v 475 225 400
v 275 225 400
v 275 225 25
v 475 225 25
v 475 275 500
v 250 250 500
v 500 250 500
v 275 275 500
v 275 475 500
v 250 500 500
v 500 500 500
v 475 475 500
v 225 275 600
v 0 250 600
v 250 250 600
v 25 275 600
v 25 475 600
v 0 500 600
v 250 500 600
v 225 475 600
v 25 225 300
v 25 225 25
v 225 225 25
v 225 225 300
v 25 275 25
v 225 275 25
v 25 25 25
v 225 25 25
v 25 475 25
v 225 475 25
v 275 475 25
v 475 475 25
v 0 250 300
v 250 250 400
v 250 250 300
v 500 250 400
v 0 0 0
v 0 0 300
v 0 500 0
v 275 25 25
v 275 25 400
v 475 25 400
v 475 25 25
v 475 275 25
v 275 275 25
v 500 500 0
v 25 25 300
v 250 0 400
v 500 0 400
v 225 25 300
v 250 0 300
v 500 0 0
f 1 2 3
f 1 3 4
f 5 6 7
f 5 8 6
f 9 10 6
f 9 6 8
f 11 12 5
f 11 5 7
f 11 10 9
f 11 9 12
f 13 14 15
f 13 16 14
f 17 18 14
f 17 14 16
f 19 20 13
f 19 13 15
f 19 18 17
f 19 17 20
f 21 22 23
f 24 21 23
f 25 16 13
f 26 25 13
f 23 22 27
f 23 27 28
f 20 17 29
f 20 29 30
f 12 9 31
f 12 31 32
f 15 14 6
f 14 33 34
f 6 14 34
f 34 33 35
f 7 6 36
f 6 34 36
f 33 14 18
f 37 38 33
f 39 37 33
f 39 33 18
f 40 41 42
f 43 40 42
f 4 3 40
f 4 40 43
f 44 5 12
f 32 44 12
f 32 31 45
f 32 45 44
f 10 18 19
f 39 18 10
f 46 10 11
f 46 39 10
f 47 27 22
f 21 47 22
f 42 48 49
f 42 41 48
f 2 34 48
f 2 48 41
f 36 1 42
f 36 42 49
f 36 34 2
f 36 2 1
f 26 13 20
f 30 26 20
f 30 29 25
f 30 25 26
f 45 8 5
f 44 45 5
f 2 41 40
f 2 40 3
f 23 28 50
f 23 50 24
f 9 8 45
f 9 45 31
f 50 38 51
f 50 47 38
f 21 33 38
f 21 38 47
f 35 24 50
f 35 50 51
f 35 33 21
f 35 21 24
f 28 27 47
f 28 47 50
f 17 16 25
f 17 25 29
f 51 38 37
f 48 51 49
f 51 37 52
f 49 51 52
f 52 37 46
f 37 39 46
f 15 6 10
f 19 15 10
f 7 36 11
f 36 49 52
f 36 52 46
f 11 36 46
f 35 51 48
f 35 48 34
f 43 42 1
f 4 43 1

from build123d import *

# Parameters (mm, degrees)
F0_W      = 250
F0_H      = 250
F1_DEPTH  = 600
F2_DEPTH  = 500
F3_DEPTH  = 400
F4_DEPTH  = 300
F5_W      = 200
F5_H      = 200
F6_DEPTH  = 575
F7_W      = 200
F7_H      = 200
F8_DEPTH  = 475
F9_W      = 200
F9_H      = 200
F10_DEPTH = 375
F11_W     = 200
F11_H     = 200
F12_DEPTH = 275


with BuildPart() as f1:
    # F0 (on Top) → F1 (new body)
    with BuildSketch(Plane.XY):
        with Locations((125, 375)):
            Rectangle(F0_W, F0_H)
    extrude(amount=F1_DEPTH)

    # F0 (on Top) → F2 (join)
    with BuildSketch(Plane.XY):
        with Locations((375, 375)):
            Rectangle(F0_W, F0_H)
    extrude(amount=F2_DEPTH)

    # F0 (on Top) → F3 (join)
    with BuildSketch(Plane.XY):
        with Locations((375, 125)):
            Rectangle(F0_W, F0_H)
    extrude(amount=F3_DEPTH)

    # F0 (on Top) → F4 (join)
    with BuildSketch(Plane.XY):
        with Locations((125, 125)):
            Rectangle(F0_W, F0_H)
    extrude(amount=F4_DEPTH)

    # F5 (on face) → F6 (cut)
    with BuildSketch(Plane.XY.offset(600)):
        with Locations((125, 375)):
            Rectangle(F5_W, F5_H)
    extrude(amount=-F6_DEPTH, mode=Mode.SUBTRACT)

    # F7 (on face) → F8 (cut)
    with BuildSketch(Plane.XY.offset(500)):
        with Locations((375, 375)):
            Rectangle(F7_W, F7_H)
    extrude(amount=-F8_DEPTH, mode=Mode.SUBTRACT)

    # F9 (on face) → F10 (cut)
    with BuildSketch(Plane.XY.offset(400)):
        with Locations((375, 125)):
            Rectangle(F9_W, F9_H)
    extrude(amount=-F10_DEPTH, mode=Mode.SUBTRACT)

    # F11 (on face) → F12 (cut)
    with BuildSketch(Plane.XY.offset(300)):
        with Locations((125, 125)):
            Rectangle(F11_W, F11_H)
    extrude(amount=-F12_DEPTH, mode=Mode.SUBTRACT)


solid = f1.part
